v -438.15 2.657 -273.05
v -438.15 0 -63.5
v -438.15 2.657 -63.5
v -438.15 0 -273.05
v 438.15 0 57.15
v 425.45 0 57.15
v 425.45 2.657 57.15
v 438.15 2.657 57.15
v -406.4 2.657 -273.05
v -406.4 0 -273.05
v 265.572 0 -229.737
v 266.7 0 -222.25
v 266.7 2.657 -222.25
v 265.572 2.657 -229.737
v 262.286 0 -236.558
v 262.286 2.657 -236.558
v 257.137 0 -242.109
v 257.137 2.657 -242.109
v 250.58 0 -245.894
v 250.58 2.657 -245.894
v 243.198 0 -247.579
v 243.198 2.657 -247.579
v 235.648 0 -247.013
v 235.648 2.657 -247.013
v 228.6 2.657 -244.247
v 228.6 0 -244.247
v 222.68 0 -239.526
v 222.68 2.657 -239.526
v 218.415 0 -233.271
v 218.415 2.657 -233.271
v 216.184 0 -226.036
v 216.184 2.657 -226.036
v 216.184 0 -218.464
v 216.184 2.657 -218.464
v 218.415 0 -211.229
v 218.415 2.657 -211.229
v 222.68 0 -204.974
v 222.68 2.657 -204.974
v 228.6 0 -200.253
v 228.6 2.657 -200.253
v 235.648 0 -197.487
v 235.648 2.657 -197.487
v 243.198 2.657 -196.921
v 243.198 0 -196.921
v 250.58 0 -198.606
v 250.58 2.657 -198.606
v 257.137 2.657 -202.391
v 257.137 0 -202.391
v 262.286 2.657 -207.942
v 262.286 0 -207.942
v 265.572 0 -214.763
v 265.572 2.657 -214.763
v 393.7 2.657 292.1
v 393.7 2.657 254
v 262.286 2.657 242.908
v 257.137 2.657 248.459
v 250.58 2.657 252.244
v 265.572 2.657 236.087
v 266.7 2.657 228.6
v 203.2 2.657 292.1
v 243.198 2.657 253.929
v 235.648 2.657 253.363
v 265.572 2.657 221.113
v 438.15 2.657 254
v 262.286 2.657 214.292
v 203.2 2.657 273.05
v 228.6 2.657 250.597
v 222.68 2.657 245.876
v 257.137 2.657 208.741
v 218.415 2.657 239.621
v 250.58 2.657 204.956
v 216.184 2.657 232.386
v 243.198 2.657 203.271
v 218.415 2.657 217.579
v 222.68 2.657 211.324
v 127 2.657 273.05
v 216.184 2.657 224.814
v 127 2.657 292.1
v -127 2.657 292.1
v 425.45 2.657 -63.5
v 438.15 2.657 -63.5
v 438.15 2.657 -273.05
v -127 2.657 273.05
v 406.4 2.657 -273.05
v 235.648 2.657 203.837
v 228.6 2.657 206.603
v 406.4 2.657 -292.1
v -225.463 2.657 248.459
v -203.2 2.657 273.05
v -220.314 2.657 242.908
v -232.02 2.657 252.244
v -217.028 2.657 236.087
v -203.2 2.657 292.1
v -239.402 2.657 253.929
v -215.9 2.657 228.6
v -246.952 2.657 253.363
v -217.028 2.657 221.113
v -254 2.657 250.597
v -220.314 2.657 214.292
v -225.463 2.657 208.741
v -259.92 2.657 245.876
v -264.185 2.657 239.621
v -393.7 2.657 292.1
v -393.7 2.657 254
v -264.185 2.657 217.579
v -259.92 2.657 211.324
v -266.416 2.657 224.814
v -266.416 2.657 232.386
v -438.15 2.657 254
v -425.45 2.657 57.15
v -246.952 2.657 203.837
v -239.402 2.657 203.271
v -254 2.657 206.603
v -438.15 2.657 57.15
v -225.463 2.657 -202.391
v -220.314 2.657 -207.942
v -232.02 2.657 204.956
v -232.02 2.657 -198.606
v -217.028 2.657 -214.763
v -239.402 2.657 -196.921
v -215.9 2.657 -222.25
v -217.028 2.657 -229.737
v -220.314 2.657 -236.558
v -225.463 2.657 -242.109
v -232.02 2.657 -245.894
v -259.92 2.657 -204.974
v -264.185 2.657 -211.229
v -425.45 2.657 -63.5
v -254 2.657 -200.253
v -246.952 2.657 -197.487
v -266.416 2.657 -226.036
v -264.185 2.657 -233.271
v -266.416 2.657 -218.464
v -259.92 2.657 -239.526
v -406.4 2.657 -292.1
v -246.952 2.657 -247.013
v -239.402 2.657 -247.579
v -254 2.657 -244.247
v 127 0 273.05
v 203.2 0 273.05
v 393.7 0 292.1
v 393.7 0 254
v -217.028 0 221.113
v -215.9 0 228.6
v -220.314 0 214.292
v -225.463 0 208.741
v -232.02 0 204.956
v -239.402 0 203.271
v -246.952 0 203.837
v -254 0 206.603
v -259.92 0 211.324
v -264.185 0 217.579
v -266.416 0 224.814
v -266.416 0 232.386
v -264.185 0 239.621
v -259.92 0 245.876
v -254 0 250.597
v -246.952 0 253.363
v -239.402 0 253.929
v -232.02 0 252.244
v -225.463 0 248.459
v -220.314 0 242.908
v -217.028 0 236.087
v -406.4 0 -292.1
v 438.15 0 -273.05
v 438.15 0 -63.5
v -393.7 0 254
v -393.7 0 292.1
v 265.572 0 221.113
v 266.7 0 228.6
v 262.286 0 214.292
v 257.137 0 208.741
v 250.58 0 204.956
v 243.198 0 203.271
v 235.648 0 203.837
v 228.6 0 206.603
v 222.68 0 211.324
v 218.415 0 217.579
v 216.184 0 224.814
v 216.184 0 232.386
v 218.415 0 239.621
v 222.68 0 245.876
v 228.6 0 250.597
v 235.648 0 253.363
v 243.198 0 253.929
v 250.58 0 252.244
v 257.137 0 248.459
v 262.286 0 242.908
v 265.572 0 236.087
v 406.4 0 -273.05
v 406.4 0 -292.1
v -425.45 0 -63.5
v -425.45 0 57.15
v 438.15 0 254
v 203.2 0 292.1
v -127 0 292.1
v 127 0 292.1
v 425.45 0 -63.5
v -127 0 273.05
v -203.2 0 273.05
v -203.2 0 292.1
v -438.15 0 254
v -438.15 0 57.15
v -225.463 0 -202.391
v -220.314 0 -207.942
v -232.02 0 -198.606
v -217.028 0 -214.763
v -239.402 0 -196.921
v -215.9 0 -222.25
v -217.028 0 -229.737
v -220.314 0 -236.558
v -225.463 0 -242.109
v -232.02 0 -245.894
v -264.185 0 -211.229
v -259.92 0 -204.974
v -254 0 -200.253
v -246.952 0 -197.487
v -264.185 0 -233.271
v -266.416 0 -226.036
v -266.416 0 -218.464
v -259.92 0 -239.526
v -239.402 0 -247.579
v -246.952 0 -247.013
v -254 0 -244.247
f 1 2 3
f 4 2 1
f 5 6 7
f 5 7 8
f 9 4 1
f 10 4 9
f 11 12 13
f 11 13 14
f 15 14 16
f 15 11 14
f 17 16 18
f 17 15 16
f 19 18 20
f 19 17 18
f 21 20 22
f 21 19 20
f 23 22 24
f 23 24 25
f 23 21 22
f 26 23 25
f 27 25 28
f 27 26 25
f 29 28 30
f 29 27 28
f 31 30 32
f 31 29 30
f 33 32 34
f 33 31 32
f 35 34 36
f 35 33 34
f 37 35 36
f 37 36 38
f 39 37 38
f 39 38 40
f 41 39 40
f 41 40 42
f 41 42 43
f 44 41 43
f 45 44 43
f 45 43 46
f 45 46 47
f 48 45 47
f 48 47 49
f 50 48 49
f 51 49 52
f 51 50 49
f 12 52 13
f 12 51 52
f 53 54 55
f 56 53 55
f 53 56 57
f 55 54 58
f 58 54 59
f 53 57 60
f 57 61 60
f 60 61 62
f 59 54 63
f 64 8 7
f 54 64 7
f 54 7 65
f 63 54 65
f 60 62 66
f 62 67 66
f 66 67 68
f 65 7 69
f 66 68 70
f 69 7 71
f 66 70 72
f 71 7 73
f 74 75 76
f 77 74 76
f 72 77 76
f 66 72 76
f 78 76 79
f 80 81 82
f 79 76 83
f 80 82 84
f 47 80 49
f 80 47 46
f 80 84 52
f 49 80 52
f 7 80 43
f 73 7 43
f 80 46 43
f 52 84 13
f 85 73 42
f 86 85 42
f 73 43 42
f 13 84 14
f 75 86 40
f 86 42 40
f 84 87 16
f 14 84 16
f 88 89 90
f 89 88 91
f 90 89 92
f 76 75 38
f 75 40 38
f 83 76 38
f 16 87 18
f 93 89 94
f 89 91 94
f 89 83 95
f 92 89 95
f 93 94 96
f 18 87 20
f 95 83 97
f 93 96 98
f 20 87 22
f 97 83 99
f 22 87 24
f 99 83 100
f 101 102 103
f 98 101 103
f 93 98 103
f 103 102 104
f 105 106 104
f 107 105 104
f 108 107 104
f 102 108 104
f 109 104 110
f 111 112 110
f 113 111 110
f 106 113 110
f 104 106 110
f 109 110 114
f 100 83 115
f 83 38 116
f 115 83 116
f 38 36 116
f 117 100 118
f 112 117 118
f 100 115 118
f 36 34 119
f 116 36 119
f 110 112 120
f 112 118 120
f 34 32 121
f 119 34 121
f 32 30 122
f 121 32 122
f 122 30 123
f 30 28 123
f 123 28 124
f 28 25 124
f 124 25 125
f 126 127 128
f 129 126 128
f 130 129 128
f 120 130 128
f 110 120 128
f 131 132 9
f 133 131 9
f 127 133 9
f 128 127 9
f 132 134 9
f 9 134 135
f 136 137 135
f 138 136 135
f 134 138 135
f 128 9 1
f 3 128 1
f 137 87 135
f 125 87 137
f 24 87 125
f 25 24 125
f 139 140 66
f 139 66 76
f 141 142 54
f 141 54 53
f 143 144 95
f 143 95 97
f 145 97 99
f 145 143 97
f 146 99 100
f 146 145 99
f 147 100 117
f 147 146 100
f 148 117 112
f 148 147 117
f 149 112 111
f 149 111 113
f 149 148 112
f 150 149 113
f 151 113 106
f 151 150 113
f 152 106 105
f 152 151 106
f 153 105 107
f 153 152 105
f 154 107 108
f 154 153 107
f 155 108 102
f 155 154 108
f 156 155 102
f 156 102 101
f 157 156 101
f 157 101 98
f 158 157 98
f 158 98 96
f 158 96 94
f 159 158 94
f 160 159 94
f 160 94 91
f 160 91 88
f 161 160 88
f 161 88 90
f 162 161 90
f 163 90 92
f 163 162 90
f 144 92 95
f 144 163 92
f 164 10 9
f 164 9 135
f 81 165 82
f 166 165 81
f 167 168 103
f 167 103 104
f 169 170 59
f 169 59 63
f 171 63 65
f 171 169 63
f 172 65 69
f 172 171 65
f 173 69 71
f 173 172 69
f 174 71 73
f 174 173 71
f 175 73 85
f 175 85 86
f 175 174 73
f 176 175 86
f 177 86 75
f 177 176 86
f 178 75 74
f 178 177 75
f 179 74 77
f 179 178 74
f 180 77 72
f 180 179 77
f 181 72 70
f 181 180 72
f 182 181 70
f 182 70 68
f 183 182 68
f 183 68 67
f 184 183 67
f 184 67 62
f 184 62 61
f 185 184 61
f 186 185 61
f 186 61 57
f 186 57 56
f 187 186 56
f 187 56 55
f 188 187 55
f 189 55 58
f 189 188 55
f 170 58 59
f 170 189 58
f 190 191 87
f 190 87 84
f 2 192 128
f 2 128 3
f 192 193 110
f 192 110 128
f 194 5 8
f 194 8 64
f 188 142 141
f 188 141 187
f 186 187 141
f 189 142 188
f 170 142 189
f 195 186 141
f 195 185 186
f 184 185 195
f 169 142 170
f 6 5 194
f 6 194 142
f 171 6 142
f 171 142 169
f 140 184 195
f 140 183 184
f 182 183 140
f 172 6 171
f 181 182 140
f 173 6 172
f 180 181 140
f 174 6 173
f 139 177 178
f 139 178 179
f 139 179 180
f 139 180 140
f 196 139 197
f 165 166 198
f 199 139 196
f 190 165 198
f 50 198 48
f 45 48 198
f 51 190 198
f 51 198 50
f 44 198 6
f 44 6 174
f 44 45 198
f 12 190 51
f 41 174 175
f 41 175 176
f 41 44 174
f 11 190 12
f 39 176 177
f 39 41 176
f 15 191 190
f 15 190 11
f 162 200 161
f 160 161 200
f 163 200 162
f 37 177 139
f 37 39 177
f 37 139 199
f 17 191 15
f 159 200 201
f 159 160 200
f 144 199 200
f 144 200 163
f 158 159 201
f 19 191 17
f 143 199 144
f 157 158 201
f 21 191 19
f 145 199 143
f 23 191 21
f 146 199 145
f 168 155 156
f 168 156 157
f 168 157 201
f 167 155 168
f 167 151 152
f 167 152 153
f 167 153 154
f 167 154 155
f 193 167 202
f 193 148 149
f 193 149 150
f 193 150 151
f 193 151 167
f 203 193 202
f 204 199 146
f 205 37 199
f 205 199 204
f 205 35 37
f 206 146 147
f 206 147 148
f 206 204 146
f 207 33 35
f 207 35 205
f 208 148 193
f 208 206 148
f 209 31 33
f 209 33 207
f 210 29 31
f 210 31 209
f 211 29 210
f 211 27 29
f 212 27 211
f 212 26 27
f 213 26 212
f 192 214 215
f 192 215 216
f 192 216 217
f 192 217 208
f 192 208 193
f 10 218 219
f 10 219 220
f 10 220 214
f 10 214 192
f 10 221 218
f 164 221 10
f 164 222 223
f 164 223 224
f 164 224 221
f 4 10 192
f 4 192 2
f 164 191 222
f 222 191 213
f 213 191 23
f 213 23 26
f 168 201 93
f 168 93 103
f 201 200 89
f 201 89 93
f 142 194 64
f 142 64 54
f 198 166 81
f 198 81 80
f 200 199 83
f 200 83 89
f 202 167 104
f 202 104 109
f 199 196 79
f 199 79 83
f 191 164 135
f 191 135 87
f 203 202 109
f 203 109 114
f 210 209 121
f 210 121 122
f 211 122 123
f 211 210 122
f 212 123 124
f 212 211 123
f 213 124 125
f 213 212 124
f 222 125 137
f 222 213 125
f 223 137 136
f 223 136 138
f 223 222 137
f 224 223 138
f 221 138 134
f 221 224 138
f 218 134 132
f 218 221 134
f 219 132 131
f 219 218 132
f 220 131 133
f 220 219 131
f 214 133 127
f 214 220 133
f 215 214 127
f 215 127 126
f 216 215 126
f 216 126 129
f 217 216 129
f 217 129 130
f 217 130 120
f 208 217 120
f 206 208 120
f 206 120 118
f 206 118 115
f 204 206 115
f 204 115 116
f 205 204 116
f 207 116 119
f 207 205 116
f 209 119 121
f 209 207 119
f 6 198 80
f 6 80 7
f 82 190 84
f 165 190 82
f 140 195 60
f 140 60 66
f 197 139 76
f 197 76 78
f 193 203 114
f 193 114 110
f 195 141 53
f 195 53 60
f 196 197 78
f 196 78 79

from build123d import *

# Parameters (mm, degrees)
SKETCH1_R           = 25.4
BOSS_EXTRUDE1_DEPTH = 2.65684


with BuildPart() as part:
    # Sketch1 → Boss-Extrude1 (new body)
    with BuildSketch(Plane(origin=(0, 0, 0), x_dir=(1, 0, 0), z_dir=(0, 1, 0))):
        Polygon((-438.15, 273.05), (-406.4, 273.05), (-406.4, 292.1), (406.4, 292.1), (406.4, 273.05), (438.15, 273.05), (438.15, 63.5), (425.45, 63.5), (425.45, -57.15), (438.15, -57.15), (438.15, -254), (393.7, -254), (393.7, -292.1), (203.2, -292.1), (203.2, -273.05), (127, -273.05), (127, -292.1), (-127, -292.1), (-127, -273.05), (-203.2, -273.05), (-203.2, -292.1), (-393.7, -292.1), (-393.7, -254), (-438.15, -254), (-438.15, -57.15), (-425.45, -57.15), (-425.45, 63.5), (-438.15, 63.5), align=None)
        with Locations((241.3, 222.25)):
            Circle(SKETCH1_R, mode=Mode.SUBTRACT)
        with Locations((241.3, -228.6)):
            Circle(SKETCH1_R, mode=Mode.SUBTRACT)
        with Locations((-241.3, 222.25)):
            Circle(SKETCH1_R, mode=Mode.SUBTRACT)
        with Locations((-241.3, -228.6)):
            Circle(SKETCH1_R, mode=Mode.SUBTRACT)
    extrude(amount=BOSS_EXTRUDE1_DEPTH)


solid = part.part
